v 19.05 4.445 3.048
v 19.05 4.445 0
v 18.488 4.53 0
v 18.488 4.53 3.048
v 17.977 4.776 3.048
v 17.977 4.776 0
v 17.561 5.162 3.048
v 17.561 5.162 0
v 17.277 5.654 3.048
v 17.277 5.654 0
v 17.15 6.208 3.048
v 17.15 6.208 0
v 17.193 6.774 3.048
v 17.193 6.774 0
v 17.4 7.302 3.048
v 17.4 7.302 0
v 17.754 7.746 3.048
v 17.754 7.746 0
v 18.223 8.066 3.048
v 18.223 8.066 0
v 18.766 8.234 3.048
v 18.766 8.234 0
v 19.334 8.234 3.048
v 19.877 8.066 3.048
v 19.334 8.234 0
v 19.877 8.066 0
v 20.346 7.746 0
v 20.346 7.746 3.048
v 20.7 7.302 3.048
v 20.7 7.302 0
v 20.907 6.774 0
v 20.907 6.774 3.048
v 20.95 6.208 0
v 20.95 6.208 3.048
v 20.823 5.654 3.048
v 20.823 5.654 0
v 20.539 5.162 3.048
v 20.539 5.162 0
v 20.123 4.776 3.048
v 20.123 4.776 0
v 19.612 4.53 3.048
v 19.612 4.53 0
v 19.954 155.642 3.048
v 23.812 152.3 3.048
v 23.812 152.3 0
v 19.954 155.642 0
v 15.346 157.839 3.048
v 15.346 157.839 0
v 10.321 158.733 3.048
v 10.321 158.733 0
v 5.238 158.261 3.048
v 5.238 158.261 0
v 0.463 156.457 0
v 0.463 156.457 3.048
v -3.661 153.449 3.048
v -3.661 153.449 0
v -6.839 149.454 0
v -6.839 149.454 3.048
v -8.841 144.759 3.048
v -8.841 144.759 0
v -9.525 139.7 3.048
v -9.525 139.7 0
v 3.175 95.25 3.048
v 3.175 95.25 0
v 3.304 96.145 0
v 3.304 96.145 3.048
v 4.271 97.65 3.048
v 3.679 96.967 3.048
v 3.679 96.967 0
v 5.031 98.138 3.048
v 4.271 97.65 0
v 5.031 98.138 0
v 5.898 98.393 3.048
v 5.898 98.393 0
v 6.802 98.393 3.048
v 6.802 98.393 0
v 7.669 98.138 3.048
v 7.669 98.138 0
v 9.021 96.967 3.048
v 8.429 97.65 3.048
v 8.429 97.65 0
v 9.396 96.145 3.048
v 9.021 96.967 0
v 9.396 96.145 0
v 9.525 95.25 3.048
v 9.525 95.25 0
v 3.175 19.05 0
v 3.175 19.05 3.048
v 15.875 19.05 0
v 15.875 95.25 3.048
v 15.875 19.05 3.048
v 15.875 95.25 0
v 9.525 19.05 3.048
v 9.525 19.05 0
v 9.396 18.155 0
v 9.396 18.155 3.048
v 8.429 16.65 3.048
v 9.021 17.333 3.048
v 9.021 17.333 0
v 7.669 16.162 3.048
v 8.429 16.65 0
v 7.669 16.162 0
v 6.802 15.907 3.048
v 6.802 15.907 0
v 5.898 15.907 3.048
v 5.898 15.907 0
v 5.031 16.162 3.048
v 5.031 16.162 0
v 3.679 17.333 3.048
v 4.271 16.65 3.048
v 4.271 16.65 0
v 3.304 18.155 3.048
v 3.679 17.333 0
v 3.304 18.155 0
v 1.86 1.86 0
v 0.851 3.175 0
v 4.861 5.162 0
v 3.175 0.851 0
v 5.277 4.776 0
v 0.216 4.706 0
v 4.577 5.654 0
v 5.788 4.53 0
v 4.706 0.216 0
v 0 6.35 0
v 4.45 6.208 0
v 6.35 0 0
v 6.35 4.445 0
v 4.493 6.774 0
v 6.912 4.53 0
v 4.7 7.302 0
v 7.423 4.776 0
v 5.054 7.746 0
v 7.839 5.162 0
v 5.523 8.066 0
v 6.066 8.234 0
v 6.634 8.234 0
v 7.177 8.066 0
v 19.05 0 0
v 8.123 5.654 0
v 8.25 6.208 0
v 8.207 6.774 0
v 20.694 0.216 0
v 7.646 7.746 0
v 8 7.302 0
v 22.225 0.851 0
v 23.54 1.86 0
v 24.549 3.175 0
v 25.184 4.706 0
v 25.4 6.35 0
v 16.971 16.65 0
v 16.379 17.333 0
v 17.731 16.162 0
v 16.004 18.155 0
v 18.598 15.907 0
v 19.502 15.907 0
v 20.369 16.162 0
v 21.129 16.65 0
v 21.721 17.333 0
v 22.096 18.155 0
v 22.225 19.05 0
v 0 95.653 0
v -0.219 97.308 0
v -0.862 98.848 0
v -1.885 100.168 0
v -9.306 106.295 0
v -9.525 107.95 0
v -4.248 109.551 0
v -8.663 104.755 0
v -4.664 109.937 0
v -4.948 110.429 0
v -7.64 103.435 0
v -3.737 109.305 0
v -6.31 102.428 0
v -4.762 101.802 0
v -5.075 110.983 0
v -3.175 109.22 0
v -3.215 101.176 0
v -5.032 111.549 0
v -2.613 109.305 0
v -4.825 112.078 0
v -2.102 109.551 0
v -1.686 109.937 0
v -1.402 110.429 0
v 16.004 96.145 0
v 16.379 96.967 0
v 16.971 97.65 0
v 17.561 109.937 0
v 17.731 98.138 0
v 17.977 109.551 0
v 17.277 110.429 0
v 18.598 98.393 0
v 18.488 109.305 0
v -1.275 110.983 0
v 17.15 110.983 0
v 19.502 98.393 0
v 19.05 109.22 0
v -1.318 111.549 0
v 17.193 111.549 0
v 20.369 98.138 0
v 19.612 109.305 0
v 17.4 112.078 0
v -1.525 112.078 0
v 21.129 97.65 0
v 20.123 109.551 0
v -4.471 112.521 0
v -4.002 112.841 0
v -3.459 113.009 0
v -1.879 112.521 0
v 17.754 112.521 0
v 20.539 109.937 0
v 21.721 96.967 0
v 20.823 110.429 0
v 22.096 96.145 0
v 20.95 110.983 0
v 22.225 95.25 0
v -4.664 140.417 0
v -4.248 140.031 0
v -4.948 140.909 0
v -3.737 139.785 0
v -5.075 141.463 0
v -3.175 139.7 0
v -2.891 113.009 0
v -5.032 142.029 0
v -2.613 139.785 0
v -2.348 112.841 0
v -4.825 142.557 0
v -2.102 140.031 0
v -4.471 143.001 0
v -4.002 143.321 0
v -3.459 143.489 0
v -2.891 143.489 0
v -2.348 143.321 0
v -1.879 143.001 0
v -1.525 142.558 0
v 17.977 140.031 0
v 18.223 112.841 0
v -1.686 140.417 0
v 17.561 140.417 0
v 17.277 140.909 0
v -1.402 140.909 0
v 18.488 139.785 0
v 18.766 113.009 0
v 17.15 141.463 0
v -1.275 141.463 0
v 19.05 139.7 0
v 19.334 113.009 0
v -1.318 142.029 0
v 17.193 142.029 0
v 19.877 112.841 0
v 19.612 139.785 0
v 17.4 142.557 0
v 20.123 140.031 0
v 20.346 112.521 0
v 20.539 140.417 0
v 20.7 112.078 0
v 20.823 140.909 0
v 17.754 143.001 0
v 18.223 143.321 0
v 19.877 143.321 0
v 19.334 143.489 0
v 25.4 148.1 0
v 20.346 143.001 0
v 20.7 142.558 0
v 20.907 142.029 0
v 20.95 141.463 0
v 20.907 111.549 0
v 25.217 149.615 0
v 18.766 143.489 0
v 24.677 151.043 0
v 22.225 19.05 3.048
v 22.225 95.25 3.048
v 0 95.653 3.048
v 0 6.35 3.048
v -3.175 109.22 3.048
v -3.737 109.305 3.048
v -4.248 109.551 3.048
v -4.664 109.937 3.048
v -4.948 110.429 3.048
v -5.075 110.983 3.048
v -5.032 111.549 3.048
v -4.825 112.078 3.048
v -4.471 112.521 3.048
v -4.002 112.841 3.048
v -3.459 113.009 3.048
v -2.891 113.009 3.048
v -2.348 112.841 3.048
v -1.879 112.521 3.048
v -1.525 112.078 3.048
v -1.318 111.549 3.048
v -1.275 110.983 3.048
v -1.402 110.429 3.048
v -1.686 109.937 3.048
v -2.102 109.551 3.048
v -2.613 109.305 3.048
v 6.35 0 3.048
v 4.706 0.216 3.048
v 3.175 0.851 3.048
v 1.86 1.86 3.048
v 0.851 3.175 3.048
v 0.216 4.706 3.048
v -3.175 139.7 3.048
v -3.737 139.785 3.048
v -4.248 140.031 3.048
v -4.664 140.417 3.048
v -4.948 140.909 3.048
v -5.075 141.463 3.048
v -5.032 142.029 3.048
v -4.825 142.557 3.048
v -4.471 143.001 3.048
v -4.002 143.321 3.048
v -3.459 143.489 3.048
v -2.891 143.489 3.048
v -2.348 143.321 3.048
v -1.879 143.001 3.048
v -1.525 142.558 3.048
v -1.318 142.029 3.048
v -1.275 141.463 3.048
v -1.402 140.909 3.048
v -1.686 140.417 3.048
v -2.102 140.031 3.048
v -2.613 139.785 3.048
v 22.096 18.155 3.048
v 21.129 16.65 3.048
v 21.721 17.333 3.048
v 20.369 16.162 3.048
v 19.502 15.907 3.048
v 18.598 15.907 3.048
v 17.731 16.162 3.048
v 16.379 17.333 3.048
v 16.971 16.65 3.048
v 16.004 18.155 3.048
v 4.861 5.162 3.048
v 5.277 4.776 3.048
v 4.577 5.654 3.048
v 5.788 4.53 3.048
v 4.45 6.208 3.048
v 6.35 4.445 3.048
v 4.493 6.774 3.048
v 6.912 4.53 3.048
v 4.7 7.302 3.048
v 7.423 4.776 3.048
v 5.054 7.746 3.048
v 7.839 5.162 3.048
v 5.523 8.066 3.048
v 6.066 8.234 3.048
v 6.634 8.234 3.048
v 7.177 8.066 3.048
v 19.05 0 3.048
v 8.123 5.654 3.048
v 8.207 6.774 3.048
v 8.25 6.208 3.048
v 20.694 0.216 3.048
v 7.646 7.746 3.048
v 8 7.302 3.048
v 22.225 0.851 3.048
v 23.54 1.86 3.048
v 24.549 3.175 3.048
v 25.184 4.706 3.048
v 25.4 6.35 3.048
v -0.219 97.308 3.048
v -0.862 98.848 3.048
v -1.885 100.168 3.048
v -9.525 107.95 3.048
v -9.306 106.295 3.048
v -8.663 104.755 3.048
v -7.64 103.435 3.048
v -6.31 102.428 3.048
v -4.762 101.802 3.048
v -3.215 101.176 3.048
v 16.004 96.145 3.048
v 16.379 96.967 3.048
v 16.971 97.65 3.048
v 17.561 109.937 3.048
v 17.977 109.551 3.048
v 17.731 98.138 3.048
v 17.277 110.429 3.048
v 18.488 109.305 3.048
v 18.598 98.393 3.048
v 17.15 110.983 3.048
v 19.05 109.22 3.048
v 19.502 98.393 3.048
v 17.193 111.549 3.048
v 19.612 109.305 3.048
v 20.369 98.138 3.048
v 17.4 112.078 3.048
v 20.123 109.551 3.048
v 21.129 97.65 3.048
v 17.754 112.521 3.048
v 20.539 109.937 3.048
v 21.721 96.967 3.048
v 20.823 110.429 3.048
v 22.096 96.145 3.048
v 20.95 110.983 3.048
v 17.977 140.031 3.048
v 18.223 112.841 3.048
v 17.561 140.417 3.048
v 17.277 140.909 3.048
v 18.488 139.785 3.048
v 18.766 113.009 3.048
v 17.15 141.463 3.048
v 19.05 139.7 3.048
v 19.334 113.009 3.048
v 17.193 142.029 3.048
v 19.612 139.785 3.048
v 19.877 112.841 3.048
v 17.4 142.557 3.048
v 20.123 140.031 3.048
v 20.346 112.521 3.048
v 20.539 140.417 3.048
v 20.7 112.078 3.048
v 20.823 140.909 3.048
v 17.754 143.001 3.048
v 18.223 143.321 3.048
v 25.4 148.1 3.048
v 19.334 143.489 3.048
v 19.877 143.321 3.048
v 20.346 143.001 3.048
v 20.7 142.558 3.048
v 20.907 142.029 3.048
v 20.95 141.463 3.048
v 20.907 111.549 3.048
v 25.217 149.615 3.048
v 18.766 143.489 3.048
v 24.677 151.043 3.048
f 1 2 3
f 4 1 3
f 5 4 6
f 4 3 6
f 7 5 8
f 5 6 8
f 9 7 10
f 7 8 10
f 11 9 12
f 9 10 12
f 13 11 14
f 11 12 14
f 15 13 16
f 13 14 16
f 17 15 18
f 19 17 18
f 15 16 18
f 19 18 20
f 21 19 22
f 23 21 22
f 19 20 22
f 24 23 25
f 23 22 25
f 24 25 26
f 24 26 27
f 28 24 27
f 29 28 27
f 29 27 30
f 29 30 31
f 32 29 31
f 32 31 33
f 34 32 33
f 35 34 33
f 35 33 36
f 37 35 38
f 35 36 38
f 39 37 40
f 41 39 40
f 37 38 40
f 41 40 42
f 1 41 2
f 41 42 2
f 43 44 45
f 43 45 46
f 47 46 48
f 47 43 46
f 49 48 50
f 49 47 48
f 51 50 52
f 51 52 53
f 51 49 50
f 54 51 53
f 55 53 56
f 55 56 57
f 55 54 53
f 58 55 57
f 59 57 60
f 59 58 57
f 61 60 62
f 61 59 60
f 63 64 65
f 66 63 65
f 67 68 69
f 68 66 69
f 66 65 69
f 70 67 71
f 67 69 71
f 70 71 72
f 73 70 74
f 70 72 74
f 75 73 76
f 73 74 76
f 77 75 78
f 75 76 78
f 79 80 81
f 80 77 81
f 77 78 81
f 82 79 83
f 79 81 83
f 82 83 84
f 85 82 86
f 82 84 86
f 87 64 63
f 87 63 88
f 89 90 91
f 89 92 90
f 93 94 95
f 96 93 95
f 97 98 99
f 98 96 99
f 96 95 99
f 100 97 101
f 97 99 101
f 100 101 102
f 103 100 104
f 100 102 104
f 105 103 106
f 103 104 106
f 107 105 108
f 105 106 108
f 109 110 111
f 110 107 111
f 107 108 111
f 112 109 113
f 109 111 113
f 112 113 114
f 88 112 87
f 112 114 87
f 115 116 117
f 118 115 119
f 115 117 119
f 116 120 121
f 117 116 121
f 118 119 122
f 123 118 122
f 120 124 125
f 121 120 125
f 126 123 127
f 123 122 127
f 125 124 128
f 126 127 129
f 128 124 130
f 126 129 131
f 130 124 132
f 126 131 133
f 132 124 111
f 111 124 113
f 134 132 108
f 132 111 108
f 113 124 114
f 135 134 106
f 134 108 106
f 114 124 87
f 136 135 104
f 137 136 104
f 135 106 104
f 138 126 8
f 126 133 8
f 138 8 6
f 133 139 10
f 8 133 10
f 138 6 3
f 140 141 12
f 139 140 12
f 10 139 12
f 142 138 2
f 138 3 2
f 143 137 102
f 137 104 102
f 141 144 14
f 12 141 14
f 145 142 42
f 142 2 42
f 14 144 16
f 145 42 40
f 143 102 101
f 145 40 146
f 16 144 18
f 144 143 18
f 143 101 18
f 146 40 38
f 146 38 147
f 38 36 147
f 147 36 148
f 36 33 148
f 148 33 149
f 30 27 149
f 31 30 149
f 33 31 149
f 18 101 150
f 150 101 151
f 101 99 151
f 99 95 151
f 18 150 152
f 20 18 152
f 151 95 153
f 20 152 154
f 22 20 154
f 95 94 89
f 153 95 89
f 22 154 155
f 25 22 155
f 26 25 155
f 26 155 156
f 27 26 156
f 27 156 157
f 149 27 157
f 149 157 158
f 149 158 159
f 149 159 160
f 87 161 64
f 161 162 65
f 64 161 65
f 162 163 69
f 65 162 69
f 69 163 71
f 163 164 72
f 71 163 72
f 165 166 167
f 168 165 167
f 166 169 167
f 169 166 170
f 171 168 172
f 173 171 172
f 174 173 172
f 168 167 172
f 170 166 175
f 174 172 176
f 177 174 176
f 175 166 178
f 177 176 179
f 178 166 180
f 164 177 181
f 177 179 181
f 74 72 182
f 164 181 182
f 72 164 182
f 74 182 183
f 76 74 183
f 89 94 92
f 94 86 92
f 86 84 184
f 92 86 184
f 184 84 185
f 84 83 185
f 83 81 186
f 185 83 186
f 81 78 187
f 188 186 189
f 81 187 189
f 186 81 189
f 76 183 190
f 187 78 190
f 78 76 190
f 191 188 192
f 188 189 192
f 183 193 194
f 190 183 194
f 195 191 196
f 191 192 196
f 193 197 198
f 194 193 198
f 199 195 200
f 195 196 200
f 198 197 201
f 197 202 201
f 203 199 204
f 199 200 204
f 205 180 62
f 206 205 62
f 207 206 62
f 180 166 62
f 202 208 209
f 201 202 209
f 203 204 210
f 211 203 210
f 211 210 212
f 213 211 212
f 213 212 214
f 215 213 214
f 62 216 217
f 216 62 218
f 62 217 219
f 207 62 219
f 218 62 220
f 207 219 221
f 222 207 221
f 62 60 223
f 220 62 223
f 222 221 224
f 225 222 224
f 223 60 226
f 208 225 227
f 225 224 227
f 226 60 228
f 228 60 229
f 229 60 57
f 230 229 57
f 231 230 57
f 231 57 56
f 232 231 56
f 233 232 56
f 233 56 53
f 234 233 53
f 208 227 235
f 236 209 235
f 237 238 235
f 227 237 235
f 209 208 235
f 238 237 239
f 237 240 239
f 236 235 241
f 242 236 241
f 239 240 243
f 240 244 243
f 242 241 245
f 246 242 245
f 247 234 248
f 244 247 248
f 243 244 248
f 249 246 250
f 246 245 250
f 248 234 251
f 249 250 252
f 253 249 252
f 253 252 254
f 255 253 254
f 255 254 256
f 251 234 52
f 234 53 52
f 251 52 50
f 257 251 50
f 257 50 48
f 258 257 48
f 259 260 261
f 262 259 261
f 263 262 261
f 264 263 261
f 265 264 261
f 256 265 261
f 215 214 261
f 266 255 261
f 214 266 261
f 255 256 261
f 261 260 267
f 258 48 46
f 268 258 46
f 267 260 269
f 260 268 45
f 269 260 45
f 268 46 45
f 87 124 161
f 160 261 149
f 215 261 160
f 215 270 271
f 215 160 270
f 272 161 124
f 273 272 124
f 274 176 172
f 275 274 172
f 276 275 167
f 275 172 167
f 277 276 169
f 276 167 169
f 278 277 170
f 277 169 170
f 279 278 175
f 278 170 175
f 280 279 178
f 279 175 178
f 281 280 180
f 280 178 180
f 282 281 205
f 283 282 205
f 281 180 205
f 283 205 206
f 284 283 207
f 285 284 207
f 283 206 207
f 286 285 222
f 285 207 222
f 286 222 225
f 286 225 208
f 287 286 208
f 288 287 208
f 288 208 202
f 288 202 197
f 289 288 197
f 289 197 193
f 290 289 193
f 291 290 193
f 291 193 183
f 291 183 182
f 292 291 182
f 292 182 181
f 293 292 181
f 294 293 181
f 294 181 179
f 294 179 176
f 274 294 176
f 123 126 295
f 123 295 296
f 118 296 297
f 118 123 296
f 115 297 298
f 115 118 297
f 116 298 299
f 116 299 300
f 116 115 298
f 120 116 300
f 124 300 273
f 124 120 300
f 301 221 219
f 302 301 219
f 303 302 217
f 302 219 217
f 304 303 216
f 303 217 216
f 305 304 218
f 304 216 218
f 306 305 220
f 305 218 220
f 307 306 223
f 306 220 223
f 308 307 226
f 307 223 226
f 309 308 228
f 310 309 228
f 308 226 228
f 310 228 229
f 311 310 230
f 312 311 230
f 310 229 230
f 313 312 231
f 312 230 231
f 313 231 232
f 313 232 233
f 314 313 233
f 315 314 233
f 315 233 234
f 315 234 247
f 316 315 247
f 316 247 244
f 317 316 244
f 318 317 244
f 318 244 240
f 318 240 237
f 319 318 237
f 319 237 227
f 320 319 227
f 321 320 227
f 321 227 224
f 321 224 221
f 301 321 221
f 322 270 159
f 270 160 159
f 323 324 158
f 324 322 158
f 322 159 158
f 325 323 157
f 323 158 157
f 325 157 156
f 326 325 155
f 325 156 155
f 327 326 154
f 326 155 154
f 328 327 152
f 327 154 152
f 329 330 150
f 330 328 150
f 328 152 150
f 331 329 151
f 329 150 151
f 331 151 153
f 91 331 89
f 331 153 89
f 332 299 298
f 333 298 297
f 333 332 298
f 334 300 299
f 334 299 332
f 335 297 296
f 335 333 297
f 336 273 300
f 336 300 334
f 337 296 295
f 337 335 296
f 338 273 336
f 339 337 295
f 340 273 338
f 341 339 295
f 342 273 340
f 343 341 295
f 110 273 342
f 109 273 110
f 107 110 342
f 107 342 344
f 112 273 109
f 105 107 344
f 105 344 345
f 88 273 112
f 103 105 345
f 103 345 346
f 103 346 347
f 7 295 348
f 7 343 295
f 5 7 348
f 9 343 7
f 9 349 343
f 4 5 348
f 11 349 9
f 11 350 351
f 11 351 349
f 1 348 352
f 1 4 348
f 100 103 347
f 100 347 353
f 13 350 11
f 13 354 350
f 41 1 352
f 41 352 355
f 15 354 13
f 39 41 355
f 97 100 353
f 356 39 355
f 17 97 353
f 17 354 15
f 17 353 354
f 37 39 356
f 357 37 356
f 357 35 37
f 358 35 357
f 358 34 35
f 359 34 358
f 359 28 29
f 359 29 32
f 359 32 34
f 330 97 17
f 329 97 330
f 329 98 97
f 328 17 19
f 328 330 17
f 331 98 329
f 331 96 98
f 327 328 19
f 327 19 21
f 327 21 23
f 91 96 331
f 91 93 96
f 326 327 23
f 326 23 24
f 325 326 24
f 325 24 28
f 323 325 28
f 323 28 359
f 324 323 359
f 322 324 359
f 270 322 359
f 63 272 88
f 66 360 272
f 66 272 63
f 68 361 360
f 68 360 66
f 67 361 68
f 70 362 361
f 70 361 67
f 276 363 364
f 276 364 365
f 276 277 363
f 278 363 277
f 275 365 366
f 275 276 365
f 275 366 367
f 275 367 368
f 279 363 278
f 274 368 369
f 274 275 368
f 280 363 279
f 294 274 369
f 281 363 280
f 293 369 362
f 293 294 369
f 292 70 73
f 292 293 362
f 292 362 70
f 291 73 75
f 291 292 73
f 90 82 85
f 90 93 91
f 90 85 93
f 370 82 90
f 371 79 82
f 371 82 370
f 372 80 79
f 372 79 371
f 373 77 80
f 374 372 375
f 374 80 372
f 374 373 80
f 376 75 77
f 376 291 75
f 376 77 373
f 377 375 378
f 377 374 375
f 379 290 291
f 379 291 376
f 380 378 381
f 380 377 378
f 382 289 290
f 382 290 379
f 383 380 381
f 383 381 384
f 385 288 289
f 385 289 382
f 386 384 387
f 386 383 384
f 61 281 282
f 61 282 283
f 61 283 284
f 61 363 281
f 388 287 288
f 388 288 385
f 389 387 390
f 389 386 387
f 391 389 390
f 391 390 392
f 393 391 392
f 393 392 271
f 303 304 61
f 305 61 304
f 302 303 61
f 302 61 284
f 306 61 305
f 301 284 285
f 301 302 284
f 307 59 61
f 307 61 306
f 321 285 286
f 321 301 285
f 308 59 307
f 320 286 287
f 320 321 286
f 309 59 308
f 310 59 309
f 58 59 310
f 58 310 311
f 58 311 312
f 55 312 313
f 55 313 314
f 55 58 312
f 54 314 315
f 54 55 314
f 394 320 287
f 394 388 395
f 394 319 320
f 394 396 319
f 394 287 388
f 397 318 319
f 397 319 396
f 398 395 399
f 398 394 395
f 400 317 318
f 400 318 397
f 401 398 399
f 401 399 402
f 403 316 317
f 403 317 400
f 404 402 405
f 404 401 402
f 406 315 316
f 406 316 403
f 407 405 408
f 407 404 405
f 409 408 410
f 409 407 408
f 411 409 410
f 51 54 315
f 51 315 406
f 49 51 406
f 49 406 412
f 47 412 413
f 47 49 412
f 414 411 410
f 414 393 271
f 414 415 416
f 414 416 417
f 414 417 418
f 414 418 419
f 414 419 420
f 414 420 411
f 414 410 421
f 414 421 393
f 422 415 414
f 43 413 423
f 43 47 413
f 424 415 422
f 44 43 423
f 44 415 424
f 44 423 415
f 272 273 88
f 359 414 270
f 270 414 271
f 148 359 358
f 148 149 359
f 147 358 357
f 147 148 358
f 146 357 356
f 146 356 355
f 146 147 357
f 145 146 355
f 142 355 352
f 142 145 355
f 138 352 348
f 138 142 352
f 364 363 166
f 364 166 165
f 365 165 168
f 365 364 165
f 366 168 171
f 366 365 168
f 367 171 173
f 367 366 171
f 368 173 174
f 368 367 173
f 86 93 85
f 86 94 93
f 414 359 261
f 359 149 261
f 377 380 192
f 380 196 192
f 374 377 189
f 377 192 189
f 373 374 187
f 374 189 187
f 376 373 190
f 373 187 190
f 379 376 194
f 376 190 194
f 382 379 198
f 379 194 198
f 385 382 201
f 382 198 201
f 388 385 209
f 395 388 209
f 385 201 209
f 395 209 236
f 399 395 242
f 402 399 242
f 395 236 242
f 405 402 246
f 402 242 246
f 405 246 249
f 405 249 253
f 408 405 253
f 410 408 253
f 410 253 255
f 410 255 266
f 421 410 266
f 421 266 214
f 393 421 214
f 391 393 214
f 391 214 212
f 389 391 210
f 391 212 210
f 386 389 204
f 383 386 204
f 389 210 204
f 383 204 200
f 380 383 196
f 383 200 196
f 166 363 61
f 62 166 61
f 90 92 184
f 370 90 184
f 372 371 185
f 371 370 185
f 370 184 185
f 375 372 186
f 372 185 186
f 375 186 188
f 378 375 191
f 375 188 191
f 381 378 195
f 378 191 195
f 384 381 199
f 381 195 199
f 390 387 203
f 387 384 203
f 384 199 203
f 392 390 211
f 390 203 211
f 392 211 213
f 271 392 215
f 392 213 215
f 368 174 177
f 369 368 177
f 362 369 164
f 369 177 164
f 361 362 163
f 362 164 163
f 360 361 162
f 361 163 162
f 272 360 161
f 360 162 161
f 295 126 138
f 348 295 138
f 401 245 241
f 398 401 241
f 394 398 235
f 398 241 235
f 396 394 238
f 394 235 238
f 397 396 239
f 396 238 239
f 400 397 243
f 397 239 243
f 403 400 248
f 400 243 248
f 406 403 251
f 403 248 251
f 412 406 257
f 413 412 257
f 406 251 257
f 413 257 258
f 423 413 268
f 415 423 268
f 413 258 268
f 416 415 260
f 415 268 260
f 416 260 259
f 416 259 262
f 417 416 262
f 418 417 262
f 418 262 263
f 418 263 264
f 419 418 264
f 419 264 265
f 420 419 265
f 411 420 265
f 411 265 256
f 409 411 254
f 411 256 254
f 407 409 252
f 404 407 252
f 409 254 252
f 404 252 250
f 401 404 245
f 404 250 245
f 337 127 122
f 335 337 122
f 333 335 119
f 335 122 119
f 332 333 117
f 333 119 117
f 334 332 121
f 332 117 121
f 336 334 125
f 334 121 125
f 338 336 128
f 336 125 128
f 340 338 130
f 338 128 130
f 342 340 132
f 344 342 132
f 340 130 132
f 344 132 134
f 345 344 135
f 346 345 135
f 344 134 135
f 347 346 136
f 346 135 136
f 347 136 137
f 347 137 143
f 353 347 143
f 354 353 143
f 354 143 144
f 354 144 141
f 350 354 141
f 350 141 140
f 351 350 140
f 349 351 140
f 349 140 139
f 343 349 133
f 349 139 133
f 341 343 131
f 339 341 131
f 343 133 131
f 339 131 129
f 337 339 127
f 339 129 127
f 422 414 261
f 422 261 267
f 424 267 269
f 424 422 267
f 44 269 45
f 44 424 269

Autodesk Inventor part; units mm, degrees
ref_plane "YZ Plane" through (0, 0, 0) normal (1, 0, 0) x (0, 1, 0)
ref_plane "XZ Plane" through (0, 0, 0) normal (0, 1, 0) x (-1, 0, 0)
ref_plane "XY Plane" through (0, 0, 0) normal (0, 0, 1) x (1, 0, 0)
sketch "Sketch1" plane through (0, 0, 0) normal (0, 0, 1) x (1, 0, 0)
  line L0 (0, 0) -> (25.4, 0)
  line L1 (25.4, 0) -> (25.4, 101.6)
  line L2 (25.4, 101.6) -> (0, 101.6)
  line L3 (0, 101.6) -> (0, 0)
  line L4 (6.35, 95.25) -> (6.35, 19.05) construction
  line L5 (3.175, 95.25) -> (3.175, 19.05)
  line L6 (9.525, 19.05) -> (9.525, 95.25)
  arc A0 (9.525, 95.25) -> (3.175, 95.25) centre (6.35, 95.25) ccw
  arc A1 (3.175, 19.05) -> (9.525, 19.05) centre (6.35, 19.05) ccw
  line L7 (19.05, 95.25) -> (19.05, 19.05) construction
  line L8 (15.875, 95.25) -> (15.875, 19.05)
  line L9 (22.225, 19.05) -> (22.225, 95.25)
  arc A2 (22.225, 95.25) -> (15.875, 95.25) centre (19.05, 95.25) ccw
  arc A3 (15.875, 19.05) -> (22.225, 19.05) centre (19.05, 19.05) ccw
  line L10 (6.35, 57.15) -> (19.05, 57.15) construction
  point P0 (12.7, 57.15)
  point P1 (12.7, 0)
  dimension "d2" = 6.35
  dimension "d3" = 76.2
  dimension "d4" = 19.05
  dimension "d5" = 6.35
  dimension "d7" = 12.7
  dimension "d8" = 3.175
extrude "Plate1" add sketch "Sketch1" along normal blind 3.048
sketch "Sketch2" plane through (0, 0, 3.048) normal (0, 0, 1) x (1, 0, 0)
  arc A0 (25.4, 150.2303) -> (-9.525, 139.7) centre (9.525, 139.7) ccw
  line L0 (25.4, 0) -> (25.4, 101.6)
  line L1 (25.4, 101.6) -> (0, 101.6)
  line L2 (0, 101.6) -> (-9.525, 101.6)
  line L3 (-9.525, 101.6) -> (-9.525, 139.7)
  line L4 (25.4, 101.6) -> (25.4, 150.2303)
  point P0 (0, 0)
  point P1 (28.575, 139.7)
  dimension "d10" = 38.1
  dimension "d11" = 3.175
  dimension "d12" = 38.1
  dimension "d13" = 34.925
sheet face with bend "Face2" sketch "Sketch2" thickness 3.048 toward (0, 0, -1) bend radius 3.048
bend "Bend1"
fillet "Corner Round1" radius 6.35 5 edges at (-9.525, 101.6, 1.524) (0, 101.6, 1.524) (25.4, 150.2303, 1.524) (0, 0, 1.524) (25.4, 0, 1.524)
sketch "Sketch3" plane through (0, 0, 3.048) normal (0, 0, 1) x (1, 0, 0)
  line L0 (6.35, 6.35) -> (19.05, 6.35) construction
  line L1 (19.05, 0) -> (6.35, 0) projected
  line L2 (25.4, 148.1003) -> (25.4, 6.35) projected
  line L3 (-9.525, 139.7) -> (-9.525, 107.95) projected
  line L4 (-3.175, 111.125) -> (19.05, 111.125) construction
  line L5 (-9.525, 123.825) -> (25.4, 123.825) construction
  point P0 (0, 0)
  point P1 (12.7, 6.35)
  point P2 (12.7, 0)
  point P3 (19.05, 141.605)
  point P4 (-3.175, 141.605)
  point P5 (7.9375, 123.825)
  point P6 (7.9375, 111.125)
  dimension "d20" = 6.35
  dimension "d21" = 6.35
  dimension "d22" = 6.35
  dimension "d23" = 3.175
  dimension "d25" = 30.48
hole "Hole1" at (6.35, 6.35, 3.048) at (19.05, 6.35, 3.048) at (-3.175, 111.125, 3.048) at (19.05, 111.125, 3.048) at (19.05, 141.605, 3.048) at (-3.175, 141.605, 3.048) direction (0, 0, -1) diameter 3.81 end through all clearance for "Flat Head Machine Screw (82)" size "#6" standard "Ansi Unified Screw Threads"
equation "\"d31\" = Thickness"
equation "\"d9\" = Thickness"
equation "\"d14\" = BendRadius"
equation "\"d15\" = BendReliefWidth"
equation "\"d17\" = MinimumRemnant"
equation "\"d16\" = BendReliefDepth"
equation "\"d18\" = TransitionRadius"
equation "\"BendRadius\" = Thickness"
equation "\"BendReliefWidth\" = Thickness"
equation "\"BendReliefDepth\" = 0.5 * Thickness"
equation "\"CornerReliefSize\" = 4 * Thickness"
equation "\"MinimumRemnant\" = 2 * Thickness"
equation "\"TransitionRadius\" = BendRadius"
equation "\"JacobiRadiusSize\" = BendRadius"
equation "\"GapSize\" = Thickness"
equation "\"Thickness\" = 3.048"
properties part number "Side Plate"
